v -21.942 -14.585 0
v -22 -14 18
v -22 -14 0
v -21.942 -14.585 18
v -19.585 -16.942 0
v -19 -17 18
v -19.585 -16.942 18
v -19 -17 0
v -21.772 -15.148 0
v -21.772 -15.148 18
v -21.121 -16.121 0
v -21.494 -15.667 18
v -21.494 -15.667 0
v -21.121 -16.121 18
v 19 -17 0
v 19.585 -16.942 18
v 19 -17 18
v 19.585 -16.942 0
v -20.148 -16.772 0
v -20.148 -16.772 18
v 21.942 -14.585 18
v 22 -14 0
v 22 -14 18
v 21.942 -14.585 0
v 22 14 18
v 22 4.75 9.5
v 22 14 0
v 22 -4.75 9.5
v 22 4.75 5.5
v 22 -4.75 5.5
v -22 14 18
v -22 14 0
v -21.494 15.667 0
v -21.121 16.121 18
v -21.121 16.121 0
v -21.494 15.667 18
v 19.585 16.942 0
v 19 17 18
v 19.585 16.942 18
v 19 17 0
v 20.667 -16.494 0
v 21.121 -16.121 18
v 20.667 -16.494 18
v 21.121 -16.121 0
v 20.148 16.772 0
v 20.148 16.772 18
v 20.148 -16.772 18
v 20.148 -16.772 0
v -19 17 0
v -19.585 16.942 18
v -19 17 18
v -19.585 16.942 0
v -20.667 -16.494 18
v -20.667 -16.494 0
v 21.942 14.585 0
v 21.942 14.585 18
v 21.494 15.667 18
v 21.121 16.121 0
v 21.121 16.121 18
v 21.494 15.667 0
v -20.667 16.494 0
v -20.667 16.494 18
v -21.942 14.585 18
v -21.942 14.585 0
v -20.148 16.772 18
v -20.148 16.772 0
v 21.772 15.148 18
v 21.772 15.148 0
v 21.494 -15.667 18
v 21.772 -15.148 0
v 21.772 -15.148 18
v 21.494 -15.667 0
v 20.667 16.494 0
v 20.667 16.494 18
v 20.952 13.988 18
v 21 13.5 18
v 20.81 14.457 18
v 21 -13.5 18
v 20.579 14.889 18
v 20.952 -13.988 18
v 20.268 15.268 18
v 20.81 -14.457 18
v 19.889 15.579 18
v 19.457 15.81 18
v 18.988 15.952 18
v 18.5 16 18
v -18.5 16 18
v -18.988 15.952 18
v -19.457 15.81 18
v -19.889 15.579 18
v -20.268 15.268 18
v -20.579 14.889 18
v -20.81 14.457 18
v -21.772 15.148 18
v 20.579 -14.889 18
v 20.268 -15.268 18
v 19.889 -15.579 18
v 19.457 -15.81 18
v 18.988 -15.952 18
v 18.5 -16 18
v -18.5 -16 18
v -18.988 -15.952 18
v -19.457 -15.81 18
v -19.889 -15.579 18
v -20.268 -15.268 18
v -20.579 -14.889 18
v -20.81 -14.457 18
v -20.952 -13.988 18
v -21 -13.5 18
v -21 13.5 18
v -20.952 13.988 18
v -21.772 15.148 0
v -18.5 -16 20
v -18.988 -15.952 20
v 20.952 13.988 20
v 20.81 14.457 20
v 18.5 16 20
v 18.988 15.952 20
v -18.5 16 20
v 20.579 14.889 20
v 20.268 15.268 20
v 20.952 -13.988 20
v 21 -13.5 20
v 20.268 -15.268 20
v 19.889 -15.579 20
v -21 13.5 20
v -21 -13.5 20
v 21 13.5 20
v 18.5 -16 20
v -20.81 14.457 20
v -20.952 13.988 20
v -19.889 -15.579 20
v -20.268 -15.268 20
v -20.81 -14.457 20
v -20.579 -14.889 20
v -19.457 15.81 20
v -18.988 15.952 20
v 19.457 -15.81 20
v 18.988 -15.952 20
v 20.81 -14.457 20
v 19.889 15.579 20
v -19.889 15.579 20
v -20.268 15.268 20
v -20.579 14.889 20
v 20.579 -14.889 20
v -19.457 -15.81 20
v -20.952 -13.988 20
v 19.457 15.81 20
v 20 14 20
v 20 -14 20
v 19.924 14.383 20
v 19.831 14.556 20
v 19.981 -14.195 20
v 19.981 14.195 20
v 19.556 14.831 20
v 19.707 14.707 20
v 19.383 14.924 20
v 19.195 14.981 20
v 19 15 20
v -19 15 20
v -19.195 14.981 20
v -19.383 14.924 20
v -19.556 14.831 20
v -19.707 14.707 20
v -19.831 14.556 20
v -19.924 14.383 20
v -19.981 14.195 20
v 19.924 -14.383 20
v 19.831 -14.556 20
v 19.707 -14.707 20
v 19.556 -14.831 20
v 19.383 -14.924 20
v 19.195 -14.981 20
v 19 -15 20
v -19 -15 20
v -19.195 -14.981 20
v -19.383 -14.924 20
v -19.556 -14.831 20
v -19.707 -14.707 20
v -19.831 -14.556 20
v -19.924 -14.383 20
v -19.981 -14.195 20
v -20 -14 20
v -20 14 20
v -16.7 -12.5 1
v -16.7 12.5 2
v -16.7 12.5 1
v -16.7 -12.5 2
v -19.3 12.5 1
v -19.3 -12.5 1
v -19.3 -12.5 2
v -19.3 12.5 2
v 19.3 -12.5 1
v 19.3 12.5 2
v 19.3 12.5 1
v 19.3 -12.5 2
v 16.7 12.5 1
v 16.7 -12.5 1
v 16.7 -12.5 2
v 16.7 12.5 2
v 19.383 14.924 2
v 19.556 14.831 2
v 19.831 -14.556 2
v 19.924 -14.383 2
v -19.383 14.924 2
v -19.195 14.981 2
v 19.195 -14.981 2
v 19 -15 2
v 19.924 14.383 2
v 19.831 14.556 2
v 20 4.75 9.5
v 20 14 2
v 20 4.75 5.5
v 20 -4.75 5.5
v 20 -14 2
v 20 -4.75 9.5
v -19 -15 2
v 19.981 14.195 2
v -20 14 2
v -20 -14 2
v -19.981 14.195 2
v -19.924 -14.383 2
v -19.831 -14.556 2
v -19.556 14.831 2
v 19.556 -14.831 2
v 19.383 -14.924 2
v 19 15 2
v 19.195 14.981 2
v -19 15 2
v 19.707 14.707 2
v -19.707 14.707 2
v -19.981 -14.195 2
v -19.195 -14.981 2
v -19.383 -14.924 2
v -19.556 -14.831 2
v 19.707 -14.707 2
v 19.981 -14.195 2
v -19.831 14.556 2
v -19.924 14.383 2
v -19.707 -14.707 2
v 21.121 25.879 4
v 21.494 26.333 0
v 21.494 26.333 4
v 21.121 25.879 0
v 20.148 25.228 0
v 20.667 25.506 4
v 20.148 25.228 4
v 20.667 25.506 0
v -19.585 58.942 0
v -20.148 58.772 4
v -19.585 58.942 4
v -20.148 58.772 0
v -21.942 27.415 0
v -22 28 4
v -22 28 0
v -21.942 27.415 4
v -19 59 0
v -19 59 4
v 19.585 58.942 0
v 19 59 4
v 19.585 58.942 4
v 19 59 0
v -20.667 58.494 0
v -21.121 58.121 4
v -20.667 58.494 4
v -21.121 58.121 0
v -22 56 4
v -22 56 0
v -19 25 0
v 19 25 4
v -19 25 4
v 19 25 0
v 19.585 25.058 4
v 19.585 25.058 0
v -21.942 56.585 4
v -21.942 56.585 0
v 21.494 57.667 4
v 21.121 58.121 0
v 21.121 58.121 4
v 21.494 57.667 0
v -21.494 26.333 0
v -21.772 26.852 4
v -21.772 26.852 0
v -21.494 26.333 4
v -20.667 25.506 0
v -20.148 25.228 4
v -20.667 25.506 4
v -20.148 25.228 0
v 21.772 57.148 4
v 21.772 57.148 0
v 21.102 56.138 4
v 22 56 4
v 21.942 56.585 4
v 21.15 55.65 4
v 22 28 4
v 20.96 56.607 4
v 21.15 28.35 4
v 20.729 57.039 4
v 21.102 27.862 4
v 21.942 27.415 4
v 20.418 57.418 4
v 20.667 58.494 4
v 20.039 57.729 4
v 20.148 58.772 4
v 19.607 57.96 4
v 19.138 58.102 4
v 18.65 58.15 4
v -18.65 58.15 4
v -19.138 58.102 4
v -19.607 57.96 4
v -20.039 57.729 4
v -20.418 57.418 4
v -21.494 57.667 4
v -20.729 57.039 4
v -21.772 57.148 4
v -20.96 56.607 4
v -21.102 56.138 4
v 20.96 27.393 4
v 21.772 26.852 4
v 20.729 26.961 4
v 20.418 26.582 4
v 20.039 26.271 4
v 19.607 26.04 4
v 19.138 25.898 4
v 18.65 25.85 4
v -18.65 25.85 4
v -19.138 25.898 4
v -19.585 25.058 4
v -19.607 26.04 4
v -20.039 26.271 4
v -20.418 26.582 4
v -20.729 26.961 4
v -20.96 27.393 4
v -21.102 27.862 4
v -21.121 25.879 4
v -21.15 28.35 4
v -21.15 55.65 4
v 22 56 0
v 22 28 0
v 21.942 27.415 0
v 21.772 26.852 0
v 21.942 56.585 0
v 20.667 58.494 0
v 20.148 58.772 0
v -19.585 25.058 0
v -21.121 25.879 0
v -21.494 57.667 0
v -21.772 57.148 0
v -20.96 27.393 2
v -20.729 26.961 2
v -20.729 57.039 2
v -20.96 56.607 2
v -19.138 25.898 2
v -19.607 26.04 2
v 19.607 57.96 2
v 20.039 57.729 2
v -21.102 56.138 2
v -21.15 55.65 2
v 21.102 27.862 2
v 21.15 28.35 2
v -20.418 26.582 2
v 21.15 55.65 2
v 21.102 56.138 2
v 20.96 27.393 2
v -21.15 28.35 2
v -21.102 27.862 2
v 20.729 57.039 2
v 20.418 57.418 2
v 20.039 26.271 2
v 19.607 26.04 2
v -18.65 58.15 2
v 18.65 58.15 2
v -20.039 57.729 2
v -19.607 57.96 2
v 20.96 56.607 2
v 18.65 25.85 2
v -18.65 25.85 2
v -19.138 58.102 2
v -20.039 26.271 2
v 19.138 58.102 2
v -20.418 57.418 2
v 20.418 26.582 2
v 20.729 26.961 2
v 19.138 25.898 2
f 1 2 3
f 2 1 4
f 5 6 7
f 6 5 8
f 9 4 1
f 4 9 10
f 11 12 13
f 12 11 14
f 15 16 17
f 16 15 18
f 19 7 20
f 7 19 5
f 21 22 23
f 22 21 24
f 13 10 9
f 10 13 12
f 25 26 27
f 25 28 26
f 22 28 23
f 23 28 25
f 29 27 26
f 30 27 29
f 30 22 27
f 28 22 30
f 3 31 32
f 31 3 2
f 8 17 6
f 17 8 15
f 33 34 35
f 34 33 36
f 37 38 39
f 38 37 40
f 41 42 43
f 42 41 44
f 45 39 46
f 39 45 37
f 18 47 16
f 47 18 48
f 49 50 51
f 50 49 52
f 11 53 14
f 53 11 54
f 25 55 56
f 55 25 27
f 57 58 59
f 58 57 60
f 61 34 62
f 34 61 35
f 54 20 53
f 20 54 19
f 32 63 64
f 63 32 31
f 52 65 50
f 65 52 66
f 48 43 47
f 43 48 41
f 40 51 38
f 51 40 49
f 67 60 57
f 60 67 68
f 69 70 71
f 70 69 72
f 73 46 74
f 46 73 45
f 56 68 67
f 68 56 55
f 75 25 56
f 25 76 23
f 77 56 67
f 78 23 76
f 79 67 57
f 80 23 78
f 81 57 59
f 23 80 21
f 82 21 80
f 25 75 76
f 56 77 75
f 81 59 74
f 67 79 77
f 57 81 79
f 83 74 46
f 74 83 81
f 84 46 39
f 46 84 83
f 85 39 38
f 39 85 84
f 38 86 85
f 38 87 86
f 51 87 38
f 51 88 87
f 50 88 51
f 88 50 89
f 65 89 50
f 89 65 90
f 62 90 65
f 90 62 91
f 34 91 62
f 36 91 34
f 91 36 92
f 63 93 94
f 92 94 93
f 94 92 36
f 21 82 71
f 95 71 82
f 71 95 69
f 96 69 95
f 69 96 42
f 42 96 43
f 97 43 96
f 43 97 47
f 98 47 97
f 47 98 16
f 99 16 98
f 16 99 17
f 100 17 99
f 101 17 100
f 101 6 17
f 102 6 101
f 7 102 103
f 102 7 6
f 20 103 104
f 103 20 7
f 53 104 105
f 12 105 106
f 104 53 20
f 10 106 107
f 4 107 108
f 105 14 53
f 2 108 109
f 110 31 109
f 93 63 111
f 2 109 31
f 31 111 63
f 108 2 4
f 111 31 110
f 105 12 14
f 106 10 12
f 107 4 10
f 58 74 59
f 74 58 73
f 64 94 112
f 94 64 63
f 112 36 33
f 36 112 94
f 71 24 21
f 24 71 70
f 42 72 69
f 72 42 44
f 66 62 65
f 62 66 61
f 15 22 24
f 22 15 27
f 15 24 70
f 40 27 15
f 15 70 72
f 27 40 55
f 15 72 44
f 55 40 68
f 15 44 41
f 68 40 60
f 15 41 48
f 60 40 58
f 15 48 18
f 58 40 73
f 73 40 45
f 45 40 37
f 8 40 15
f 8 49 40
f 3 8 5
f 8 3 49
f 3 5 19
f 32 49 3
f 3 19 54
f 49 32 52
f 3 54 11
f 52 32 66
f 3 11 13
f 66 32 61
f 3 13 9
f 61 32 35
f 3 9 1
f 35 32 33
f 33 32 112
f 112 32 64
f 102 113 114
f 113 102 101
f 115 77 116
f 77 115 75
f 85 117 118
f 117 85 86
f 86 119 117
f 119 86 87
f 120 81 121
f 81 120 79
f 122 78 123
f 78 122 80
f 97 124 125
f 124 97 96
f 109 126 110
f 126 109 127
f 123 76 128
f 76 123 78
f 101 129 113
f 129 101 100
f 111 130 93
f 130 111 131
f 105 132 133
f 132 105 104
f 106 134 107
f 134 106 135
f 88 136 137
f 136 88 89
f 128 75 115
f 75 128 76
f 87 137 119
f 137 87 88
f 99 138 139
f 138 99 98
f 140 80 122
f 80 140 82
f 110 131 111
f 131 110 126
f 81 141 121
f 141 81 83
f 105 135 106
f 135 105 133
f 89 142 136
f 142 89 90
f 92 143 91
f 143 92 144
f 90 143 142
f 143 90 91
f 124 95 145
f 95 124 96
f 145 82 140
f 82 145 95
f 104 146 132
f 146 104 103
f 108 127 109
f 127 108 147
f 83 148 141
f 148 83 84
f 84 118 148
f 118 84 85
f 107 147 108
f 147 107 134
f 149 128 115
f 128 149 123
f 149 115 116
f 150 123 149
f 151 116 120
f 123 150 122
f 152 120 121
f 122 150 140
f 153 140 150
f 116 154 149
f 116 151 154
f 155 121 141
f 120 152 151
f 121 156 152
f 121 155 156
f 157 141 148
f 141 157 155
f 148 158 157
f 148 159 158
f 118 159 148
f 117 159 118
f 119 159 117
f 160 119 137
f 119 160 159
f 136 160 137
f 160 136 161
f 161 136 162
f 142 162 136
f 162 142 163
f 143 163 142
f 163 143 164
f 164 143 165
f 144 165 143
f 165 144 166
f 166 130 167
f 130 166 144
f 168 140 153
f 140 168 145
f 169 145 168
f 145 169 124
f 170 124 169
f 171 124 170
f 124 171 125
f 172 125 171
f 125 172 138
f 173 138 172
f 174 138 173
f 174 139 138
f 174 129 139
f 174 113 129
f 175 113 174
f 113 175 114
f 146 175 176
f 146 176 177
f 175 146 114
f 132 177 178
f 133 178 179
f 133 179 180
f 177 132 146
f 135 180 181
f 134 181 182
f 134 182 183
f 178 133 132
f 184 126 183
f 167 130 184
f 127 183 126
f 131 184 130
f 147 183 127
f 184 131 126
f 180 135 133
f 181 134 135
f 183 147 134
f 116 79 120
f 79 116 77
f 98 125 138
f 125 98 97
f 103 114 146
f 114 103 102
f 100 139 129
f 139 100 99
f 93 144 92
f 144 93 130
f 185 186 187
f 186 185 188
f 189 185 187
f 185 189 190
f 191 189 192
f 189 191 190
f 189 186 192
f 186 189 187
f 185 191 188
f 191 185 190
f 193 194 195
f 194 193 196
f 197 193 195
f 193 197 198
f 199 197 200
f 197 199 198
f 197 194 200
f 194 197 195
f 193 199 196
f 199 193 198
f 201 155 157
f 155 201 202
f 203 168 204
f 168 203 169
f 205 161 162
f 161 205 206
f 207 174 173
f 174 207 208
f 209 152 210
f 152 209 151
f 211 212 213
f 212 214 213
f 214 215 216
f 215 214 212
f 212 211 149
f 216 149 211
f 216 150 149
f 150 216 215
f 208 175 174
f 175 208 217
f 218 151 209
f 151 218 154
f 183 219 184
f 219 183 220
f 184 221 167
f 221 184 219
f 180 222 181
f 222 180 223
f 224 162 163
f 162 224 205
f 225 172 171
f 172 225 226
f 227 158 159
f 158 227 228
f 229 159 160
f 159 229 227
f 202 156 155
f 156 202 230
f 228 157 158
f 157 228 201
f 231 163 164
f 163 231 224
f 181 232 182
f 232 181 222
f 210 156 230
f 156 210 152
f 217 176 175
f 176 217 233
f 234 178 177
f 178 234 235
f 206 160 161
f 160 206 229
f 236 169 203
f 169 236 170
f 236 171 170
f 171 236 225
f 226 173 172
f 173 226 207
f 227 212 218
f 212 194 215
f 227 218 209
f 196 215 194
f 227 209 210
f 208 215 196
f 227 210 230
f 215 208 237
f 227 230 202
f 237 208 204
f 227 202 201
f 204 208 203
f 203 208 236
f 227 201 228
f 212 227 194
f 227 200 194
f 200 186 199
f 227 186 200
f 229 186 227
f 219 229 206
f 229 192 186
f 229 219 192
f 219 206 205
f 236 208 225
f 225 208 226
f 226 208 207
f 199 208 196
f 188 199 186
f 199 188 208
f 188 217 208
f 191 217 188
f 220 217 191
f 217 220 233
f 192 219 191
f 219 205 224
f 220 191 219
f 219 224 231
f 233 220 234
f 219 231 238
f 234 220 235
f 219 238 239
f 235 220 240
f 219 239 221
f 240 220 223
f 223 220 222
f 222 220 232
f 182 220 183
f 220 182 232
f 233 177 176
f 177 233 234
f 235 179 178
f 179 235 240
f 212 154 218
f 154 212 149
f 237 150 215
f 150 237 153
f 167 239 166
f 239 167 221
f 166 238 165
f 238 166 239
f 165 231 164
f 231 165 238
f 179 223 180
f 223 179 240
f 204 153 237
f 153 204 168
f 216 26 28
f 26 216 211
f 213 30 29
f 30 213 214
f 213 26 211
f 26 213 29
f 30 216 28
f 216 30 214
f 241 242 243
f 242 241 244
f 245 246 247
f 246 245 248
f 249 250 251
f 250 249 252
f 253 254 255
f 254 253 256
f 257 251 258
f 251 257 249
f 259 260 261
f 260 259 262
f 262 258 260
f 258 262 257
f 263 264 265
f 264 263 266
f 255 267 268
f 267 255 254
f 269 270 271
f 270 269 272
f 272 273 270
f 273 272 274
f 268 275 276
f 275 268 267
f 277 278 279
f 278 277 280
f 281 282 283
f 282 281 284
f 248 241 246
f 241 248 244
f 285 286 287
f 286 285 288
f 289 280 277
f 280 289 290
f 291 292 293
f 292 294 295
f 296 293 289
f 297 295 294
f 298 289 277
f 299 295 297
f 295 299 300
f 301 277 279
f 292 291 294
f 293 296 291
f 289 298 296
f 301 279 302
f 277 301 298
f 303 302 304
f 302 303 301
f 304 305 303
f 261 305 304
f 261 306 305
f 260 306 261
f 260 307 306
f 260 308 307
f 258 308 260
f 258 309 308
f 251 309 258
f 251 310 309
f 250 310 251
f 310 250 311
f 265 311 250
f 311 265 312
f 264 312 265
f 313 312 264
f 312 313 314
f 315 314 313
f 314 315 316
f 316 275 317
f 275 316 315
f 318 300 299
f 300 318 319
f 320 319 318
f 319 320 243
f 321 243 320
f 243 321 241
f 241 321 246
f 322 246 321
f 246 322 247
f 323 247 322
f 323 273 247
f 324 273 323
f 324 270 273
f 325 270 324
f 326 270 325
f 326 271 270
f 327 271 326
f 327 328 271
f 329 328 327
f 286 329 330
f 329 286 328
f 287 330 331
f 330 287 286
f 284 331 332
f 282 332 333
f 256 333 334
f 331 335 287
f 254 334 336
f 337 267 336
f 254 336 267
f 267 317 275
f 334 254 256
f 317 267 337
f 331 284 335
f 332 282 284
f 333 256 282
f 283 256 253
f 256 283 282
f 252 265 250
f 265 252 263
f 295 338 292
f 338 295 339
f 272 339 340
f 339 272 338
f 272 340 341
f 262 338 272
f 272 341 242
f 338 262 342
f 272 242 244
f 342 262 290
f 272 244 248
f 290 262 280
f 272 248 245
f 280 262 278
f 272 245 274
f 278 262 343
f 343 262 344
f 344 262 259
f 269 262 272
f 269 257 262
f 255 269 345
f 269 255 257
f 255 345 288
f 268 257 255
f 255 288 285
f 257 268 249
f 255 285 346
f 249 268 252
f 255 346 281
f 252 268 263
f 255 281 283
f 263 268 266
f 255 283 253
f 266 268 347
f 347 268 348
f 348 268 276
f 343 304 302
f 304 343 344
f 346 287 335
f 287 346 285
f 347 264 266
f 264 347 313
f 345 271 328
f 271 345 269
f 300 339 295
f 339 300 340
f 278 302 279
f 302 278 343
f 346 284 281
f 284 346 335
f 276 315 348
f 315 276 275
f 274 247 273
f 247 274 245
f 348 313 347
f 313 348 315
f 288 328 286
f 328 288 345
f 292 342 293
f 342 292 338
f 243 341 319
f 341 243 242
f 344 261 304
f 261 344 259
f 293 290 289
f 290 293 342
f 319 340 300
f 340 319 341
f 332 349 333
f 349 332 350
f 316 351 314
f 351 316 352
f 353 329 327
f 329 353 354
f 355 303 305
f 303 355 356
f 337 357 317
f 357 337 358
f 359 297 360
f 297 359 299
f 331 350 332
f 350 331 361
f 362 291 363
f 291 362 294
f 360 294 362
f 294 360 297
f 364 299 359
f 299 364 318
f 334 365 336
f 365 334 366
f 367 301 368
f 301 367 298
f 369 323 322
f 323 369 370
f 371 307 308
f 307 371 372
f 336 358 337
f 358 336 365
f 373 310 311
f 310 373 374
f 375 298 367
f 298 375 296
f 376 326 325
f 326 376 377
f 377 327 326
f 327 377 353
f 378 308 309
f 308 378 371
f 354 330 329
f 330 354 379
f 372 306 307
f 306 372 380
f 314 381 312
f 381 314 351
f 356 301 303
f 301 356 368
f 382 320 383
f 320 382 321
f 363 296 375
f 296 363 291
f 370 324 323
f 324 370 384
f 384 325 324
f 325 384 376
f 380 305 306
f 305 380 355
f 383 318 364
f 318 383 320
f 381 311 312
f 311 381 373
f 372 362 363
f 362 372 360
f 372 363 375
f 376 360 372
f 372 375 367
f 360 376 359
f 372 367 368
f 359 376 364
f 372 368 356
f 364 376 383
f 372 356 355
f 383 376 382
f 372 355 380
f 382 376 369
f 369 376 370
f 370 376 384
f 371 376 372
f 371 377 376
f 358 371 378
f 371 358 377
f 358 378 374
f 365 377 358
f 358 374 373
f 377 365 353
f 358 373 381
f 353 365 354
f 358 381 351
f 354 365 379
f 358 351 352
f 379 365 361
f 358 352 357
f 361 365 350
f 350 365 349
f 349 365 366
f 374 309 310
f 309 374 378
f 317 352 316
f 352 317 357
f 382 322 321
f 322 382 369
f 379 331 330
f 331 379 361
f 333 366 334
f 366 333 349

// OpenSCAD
// ============================================================================
// KNTX — Carcasa Biomecánica Paramétrica para Nodo Satélite (PC4 / PC5)
// Archivo fuente editable OpenSCAD (.scad) exportable a .STL / .STEP
// Autor: Jorge Carlos Contreras Rodríguez (Diseño Mecánico / Carcasas 3D)
//
// Cumplimiento de requisitos PC2:
//  - RP-09: Volumen exterior < 40 cm^3 (44 x 34 x 22 mm = 32.9 cm^3) y masa < 50 g.
//  - RQ-04: Labio perimetral de cierre tipo machihembrado para protección IP54.
//  - RF-09: Ranuras laterales pasacinta para banda elástica de 25 mm (colocación < 5 min).
//
// Parámetros de impresión recomendados (PC4 Sección 2.1):
//  - Filamento: PETG (resistente a sudor y temperatura < 40 °C)
//  - Infill: 25% giroide | Perímetros: 3 | Altura de capa: 0.20 mm
//  - Orientación: Base plana sobre cama (capas paralelas al plano de sujeción)
// ============================================================================

$fn = 32;

// Dimensiones exteriores (mm) -> Volumen = 44 * 34 * 22 = 32,912 mm^3 = 32.91 cm^3 (< 40 cm^3)
ext_len = 44.0;
ext_wid = 34.0;
ext_hgt = 22.0;
wall    = 2.0;
fillet  = 3.0;

// Ranuras para banda elástica textil (ancho 25 mm, espesor 2.5 mm)
strap_w = 25.0;
strap_t = 2.6;

module rounded_box(l, w, h, r) {
    hull() {
        for (x = [-l/2 + r, l/2 - r])
            for (y = [-w/2 + r, w/2 - r])
                translate([x, y, 0])
                    cylinder(h = h, r = r);
    }
}

module kntx_base_housing() {
    difference() {
        union() {
            // Cuerpo principal redondeado (ergonómico sobre prominencias óseas)
            rounded_box(ext_len, ext_wid, ext_hgt - 4.0, fillet);
            // Labio superior para sellado IP54 contra salpicaduras
            translate([0, 0, ext_hgt - 4.0])
                rounded_box(ext_len - wall, ext_wid - wall, 2.0, fillet - 0.5);
        }
        // Cavidad interna para placa preperforada/PCB (ESP32-C3 + BNO085 + LiPo 400 mAh)
        translate([0, 0, wall])
            rounded_box(ext_len - 2*wall, ext_wid - 2*wall, ext_hgt, max(1.0, fillet - wall));
        // Ranura pasacinta izquierda y derecha (sujeción sin rotación sobre piel)
        for (sx = [-ext_len/2 + 4.0, ext_len/2 - 4.0]) {
            translate([sx, 0, 3.0])
                cube([strap_t, strap_w, 4.0], center = true);
        }
        // Puerto USB-C / carga con tapa elastomérica IP54
        translate([ext_len/2 - wall/2, 0, 7.5])
            cube([wall + 2.0, 9.5, 4.0], center = true);
    }
}

module kntx_lid() {
    translate([0, ext_wid + 8.0, 0])
    difference() {
        rounded_box(ext_len, ext_wid, 4.0, fillet);
        translate([0, 0, 2.0])
            rounded_box(ext_len - wall + 0.3, ext_wid - wall + 0.3, 2.2, fillet - 0.5);
    }
}

// Renderizar base y tapa lado a lado para impresión 3D
kntx_base_housing();
kntx_lid();
